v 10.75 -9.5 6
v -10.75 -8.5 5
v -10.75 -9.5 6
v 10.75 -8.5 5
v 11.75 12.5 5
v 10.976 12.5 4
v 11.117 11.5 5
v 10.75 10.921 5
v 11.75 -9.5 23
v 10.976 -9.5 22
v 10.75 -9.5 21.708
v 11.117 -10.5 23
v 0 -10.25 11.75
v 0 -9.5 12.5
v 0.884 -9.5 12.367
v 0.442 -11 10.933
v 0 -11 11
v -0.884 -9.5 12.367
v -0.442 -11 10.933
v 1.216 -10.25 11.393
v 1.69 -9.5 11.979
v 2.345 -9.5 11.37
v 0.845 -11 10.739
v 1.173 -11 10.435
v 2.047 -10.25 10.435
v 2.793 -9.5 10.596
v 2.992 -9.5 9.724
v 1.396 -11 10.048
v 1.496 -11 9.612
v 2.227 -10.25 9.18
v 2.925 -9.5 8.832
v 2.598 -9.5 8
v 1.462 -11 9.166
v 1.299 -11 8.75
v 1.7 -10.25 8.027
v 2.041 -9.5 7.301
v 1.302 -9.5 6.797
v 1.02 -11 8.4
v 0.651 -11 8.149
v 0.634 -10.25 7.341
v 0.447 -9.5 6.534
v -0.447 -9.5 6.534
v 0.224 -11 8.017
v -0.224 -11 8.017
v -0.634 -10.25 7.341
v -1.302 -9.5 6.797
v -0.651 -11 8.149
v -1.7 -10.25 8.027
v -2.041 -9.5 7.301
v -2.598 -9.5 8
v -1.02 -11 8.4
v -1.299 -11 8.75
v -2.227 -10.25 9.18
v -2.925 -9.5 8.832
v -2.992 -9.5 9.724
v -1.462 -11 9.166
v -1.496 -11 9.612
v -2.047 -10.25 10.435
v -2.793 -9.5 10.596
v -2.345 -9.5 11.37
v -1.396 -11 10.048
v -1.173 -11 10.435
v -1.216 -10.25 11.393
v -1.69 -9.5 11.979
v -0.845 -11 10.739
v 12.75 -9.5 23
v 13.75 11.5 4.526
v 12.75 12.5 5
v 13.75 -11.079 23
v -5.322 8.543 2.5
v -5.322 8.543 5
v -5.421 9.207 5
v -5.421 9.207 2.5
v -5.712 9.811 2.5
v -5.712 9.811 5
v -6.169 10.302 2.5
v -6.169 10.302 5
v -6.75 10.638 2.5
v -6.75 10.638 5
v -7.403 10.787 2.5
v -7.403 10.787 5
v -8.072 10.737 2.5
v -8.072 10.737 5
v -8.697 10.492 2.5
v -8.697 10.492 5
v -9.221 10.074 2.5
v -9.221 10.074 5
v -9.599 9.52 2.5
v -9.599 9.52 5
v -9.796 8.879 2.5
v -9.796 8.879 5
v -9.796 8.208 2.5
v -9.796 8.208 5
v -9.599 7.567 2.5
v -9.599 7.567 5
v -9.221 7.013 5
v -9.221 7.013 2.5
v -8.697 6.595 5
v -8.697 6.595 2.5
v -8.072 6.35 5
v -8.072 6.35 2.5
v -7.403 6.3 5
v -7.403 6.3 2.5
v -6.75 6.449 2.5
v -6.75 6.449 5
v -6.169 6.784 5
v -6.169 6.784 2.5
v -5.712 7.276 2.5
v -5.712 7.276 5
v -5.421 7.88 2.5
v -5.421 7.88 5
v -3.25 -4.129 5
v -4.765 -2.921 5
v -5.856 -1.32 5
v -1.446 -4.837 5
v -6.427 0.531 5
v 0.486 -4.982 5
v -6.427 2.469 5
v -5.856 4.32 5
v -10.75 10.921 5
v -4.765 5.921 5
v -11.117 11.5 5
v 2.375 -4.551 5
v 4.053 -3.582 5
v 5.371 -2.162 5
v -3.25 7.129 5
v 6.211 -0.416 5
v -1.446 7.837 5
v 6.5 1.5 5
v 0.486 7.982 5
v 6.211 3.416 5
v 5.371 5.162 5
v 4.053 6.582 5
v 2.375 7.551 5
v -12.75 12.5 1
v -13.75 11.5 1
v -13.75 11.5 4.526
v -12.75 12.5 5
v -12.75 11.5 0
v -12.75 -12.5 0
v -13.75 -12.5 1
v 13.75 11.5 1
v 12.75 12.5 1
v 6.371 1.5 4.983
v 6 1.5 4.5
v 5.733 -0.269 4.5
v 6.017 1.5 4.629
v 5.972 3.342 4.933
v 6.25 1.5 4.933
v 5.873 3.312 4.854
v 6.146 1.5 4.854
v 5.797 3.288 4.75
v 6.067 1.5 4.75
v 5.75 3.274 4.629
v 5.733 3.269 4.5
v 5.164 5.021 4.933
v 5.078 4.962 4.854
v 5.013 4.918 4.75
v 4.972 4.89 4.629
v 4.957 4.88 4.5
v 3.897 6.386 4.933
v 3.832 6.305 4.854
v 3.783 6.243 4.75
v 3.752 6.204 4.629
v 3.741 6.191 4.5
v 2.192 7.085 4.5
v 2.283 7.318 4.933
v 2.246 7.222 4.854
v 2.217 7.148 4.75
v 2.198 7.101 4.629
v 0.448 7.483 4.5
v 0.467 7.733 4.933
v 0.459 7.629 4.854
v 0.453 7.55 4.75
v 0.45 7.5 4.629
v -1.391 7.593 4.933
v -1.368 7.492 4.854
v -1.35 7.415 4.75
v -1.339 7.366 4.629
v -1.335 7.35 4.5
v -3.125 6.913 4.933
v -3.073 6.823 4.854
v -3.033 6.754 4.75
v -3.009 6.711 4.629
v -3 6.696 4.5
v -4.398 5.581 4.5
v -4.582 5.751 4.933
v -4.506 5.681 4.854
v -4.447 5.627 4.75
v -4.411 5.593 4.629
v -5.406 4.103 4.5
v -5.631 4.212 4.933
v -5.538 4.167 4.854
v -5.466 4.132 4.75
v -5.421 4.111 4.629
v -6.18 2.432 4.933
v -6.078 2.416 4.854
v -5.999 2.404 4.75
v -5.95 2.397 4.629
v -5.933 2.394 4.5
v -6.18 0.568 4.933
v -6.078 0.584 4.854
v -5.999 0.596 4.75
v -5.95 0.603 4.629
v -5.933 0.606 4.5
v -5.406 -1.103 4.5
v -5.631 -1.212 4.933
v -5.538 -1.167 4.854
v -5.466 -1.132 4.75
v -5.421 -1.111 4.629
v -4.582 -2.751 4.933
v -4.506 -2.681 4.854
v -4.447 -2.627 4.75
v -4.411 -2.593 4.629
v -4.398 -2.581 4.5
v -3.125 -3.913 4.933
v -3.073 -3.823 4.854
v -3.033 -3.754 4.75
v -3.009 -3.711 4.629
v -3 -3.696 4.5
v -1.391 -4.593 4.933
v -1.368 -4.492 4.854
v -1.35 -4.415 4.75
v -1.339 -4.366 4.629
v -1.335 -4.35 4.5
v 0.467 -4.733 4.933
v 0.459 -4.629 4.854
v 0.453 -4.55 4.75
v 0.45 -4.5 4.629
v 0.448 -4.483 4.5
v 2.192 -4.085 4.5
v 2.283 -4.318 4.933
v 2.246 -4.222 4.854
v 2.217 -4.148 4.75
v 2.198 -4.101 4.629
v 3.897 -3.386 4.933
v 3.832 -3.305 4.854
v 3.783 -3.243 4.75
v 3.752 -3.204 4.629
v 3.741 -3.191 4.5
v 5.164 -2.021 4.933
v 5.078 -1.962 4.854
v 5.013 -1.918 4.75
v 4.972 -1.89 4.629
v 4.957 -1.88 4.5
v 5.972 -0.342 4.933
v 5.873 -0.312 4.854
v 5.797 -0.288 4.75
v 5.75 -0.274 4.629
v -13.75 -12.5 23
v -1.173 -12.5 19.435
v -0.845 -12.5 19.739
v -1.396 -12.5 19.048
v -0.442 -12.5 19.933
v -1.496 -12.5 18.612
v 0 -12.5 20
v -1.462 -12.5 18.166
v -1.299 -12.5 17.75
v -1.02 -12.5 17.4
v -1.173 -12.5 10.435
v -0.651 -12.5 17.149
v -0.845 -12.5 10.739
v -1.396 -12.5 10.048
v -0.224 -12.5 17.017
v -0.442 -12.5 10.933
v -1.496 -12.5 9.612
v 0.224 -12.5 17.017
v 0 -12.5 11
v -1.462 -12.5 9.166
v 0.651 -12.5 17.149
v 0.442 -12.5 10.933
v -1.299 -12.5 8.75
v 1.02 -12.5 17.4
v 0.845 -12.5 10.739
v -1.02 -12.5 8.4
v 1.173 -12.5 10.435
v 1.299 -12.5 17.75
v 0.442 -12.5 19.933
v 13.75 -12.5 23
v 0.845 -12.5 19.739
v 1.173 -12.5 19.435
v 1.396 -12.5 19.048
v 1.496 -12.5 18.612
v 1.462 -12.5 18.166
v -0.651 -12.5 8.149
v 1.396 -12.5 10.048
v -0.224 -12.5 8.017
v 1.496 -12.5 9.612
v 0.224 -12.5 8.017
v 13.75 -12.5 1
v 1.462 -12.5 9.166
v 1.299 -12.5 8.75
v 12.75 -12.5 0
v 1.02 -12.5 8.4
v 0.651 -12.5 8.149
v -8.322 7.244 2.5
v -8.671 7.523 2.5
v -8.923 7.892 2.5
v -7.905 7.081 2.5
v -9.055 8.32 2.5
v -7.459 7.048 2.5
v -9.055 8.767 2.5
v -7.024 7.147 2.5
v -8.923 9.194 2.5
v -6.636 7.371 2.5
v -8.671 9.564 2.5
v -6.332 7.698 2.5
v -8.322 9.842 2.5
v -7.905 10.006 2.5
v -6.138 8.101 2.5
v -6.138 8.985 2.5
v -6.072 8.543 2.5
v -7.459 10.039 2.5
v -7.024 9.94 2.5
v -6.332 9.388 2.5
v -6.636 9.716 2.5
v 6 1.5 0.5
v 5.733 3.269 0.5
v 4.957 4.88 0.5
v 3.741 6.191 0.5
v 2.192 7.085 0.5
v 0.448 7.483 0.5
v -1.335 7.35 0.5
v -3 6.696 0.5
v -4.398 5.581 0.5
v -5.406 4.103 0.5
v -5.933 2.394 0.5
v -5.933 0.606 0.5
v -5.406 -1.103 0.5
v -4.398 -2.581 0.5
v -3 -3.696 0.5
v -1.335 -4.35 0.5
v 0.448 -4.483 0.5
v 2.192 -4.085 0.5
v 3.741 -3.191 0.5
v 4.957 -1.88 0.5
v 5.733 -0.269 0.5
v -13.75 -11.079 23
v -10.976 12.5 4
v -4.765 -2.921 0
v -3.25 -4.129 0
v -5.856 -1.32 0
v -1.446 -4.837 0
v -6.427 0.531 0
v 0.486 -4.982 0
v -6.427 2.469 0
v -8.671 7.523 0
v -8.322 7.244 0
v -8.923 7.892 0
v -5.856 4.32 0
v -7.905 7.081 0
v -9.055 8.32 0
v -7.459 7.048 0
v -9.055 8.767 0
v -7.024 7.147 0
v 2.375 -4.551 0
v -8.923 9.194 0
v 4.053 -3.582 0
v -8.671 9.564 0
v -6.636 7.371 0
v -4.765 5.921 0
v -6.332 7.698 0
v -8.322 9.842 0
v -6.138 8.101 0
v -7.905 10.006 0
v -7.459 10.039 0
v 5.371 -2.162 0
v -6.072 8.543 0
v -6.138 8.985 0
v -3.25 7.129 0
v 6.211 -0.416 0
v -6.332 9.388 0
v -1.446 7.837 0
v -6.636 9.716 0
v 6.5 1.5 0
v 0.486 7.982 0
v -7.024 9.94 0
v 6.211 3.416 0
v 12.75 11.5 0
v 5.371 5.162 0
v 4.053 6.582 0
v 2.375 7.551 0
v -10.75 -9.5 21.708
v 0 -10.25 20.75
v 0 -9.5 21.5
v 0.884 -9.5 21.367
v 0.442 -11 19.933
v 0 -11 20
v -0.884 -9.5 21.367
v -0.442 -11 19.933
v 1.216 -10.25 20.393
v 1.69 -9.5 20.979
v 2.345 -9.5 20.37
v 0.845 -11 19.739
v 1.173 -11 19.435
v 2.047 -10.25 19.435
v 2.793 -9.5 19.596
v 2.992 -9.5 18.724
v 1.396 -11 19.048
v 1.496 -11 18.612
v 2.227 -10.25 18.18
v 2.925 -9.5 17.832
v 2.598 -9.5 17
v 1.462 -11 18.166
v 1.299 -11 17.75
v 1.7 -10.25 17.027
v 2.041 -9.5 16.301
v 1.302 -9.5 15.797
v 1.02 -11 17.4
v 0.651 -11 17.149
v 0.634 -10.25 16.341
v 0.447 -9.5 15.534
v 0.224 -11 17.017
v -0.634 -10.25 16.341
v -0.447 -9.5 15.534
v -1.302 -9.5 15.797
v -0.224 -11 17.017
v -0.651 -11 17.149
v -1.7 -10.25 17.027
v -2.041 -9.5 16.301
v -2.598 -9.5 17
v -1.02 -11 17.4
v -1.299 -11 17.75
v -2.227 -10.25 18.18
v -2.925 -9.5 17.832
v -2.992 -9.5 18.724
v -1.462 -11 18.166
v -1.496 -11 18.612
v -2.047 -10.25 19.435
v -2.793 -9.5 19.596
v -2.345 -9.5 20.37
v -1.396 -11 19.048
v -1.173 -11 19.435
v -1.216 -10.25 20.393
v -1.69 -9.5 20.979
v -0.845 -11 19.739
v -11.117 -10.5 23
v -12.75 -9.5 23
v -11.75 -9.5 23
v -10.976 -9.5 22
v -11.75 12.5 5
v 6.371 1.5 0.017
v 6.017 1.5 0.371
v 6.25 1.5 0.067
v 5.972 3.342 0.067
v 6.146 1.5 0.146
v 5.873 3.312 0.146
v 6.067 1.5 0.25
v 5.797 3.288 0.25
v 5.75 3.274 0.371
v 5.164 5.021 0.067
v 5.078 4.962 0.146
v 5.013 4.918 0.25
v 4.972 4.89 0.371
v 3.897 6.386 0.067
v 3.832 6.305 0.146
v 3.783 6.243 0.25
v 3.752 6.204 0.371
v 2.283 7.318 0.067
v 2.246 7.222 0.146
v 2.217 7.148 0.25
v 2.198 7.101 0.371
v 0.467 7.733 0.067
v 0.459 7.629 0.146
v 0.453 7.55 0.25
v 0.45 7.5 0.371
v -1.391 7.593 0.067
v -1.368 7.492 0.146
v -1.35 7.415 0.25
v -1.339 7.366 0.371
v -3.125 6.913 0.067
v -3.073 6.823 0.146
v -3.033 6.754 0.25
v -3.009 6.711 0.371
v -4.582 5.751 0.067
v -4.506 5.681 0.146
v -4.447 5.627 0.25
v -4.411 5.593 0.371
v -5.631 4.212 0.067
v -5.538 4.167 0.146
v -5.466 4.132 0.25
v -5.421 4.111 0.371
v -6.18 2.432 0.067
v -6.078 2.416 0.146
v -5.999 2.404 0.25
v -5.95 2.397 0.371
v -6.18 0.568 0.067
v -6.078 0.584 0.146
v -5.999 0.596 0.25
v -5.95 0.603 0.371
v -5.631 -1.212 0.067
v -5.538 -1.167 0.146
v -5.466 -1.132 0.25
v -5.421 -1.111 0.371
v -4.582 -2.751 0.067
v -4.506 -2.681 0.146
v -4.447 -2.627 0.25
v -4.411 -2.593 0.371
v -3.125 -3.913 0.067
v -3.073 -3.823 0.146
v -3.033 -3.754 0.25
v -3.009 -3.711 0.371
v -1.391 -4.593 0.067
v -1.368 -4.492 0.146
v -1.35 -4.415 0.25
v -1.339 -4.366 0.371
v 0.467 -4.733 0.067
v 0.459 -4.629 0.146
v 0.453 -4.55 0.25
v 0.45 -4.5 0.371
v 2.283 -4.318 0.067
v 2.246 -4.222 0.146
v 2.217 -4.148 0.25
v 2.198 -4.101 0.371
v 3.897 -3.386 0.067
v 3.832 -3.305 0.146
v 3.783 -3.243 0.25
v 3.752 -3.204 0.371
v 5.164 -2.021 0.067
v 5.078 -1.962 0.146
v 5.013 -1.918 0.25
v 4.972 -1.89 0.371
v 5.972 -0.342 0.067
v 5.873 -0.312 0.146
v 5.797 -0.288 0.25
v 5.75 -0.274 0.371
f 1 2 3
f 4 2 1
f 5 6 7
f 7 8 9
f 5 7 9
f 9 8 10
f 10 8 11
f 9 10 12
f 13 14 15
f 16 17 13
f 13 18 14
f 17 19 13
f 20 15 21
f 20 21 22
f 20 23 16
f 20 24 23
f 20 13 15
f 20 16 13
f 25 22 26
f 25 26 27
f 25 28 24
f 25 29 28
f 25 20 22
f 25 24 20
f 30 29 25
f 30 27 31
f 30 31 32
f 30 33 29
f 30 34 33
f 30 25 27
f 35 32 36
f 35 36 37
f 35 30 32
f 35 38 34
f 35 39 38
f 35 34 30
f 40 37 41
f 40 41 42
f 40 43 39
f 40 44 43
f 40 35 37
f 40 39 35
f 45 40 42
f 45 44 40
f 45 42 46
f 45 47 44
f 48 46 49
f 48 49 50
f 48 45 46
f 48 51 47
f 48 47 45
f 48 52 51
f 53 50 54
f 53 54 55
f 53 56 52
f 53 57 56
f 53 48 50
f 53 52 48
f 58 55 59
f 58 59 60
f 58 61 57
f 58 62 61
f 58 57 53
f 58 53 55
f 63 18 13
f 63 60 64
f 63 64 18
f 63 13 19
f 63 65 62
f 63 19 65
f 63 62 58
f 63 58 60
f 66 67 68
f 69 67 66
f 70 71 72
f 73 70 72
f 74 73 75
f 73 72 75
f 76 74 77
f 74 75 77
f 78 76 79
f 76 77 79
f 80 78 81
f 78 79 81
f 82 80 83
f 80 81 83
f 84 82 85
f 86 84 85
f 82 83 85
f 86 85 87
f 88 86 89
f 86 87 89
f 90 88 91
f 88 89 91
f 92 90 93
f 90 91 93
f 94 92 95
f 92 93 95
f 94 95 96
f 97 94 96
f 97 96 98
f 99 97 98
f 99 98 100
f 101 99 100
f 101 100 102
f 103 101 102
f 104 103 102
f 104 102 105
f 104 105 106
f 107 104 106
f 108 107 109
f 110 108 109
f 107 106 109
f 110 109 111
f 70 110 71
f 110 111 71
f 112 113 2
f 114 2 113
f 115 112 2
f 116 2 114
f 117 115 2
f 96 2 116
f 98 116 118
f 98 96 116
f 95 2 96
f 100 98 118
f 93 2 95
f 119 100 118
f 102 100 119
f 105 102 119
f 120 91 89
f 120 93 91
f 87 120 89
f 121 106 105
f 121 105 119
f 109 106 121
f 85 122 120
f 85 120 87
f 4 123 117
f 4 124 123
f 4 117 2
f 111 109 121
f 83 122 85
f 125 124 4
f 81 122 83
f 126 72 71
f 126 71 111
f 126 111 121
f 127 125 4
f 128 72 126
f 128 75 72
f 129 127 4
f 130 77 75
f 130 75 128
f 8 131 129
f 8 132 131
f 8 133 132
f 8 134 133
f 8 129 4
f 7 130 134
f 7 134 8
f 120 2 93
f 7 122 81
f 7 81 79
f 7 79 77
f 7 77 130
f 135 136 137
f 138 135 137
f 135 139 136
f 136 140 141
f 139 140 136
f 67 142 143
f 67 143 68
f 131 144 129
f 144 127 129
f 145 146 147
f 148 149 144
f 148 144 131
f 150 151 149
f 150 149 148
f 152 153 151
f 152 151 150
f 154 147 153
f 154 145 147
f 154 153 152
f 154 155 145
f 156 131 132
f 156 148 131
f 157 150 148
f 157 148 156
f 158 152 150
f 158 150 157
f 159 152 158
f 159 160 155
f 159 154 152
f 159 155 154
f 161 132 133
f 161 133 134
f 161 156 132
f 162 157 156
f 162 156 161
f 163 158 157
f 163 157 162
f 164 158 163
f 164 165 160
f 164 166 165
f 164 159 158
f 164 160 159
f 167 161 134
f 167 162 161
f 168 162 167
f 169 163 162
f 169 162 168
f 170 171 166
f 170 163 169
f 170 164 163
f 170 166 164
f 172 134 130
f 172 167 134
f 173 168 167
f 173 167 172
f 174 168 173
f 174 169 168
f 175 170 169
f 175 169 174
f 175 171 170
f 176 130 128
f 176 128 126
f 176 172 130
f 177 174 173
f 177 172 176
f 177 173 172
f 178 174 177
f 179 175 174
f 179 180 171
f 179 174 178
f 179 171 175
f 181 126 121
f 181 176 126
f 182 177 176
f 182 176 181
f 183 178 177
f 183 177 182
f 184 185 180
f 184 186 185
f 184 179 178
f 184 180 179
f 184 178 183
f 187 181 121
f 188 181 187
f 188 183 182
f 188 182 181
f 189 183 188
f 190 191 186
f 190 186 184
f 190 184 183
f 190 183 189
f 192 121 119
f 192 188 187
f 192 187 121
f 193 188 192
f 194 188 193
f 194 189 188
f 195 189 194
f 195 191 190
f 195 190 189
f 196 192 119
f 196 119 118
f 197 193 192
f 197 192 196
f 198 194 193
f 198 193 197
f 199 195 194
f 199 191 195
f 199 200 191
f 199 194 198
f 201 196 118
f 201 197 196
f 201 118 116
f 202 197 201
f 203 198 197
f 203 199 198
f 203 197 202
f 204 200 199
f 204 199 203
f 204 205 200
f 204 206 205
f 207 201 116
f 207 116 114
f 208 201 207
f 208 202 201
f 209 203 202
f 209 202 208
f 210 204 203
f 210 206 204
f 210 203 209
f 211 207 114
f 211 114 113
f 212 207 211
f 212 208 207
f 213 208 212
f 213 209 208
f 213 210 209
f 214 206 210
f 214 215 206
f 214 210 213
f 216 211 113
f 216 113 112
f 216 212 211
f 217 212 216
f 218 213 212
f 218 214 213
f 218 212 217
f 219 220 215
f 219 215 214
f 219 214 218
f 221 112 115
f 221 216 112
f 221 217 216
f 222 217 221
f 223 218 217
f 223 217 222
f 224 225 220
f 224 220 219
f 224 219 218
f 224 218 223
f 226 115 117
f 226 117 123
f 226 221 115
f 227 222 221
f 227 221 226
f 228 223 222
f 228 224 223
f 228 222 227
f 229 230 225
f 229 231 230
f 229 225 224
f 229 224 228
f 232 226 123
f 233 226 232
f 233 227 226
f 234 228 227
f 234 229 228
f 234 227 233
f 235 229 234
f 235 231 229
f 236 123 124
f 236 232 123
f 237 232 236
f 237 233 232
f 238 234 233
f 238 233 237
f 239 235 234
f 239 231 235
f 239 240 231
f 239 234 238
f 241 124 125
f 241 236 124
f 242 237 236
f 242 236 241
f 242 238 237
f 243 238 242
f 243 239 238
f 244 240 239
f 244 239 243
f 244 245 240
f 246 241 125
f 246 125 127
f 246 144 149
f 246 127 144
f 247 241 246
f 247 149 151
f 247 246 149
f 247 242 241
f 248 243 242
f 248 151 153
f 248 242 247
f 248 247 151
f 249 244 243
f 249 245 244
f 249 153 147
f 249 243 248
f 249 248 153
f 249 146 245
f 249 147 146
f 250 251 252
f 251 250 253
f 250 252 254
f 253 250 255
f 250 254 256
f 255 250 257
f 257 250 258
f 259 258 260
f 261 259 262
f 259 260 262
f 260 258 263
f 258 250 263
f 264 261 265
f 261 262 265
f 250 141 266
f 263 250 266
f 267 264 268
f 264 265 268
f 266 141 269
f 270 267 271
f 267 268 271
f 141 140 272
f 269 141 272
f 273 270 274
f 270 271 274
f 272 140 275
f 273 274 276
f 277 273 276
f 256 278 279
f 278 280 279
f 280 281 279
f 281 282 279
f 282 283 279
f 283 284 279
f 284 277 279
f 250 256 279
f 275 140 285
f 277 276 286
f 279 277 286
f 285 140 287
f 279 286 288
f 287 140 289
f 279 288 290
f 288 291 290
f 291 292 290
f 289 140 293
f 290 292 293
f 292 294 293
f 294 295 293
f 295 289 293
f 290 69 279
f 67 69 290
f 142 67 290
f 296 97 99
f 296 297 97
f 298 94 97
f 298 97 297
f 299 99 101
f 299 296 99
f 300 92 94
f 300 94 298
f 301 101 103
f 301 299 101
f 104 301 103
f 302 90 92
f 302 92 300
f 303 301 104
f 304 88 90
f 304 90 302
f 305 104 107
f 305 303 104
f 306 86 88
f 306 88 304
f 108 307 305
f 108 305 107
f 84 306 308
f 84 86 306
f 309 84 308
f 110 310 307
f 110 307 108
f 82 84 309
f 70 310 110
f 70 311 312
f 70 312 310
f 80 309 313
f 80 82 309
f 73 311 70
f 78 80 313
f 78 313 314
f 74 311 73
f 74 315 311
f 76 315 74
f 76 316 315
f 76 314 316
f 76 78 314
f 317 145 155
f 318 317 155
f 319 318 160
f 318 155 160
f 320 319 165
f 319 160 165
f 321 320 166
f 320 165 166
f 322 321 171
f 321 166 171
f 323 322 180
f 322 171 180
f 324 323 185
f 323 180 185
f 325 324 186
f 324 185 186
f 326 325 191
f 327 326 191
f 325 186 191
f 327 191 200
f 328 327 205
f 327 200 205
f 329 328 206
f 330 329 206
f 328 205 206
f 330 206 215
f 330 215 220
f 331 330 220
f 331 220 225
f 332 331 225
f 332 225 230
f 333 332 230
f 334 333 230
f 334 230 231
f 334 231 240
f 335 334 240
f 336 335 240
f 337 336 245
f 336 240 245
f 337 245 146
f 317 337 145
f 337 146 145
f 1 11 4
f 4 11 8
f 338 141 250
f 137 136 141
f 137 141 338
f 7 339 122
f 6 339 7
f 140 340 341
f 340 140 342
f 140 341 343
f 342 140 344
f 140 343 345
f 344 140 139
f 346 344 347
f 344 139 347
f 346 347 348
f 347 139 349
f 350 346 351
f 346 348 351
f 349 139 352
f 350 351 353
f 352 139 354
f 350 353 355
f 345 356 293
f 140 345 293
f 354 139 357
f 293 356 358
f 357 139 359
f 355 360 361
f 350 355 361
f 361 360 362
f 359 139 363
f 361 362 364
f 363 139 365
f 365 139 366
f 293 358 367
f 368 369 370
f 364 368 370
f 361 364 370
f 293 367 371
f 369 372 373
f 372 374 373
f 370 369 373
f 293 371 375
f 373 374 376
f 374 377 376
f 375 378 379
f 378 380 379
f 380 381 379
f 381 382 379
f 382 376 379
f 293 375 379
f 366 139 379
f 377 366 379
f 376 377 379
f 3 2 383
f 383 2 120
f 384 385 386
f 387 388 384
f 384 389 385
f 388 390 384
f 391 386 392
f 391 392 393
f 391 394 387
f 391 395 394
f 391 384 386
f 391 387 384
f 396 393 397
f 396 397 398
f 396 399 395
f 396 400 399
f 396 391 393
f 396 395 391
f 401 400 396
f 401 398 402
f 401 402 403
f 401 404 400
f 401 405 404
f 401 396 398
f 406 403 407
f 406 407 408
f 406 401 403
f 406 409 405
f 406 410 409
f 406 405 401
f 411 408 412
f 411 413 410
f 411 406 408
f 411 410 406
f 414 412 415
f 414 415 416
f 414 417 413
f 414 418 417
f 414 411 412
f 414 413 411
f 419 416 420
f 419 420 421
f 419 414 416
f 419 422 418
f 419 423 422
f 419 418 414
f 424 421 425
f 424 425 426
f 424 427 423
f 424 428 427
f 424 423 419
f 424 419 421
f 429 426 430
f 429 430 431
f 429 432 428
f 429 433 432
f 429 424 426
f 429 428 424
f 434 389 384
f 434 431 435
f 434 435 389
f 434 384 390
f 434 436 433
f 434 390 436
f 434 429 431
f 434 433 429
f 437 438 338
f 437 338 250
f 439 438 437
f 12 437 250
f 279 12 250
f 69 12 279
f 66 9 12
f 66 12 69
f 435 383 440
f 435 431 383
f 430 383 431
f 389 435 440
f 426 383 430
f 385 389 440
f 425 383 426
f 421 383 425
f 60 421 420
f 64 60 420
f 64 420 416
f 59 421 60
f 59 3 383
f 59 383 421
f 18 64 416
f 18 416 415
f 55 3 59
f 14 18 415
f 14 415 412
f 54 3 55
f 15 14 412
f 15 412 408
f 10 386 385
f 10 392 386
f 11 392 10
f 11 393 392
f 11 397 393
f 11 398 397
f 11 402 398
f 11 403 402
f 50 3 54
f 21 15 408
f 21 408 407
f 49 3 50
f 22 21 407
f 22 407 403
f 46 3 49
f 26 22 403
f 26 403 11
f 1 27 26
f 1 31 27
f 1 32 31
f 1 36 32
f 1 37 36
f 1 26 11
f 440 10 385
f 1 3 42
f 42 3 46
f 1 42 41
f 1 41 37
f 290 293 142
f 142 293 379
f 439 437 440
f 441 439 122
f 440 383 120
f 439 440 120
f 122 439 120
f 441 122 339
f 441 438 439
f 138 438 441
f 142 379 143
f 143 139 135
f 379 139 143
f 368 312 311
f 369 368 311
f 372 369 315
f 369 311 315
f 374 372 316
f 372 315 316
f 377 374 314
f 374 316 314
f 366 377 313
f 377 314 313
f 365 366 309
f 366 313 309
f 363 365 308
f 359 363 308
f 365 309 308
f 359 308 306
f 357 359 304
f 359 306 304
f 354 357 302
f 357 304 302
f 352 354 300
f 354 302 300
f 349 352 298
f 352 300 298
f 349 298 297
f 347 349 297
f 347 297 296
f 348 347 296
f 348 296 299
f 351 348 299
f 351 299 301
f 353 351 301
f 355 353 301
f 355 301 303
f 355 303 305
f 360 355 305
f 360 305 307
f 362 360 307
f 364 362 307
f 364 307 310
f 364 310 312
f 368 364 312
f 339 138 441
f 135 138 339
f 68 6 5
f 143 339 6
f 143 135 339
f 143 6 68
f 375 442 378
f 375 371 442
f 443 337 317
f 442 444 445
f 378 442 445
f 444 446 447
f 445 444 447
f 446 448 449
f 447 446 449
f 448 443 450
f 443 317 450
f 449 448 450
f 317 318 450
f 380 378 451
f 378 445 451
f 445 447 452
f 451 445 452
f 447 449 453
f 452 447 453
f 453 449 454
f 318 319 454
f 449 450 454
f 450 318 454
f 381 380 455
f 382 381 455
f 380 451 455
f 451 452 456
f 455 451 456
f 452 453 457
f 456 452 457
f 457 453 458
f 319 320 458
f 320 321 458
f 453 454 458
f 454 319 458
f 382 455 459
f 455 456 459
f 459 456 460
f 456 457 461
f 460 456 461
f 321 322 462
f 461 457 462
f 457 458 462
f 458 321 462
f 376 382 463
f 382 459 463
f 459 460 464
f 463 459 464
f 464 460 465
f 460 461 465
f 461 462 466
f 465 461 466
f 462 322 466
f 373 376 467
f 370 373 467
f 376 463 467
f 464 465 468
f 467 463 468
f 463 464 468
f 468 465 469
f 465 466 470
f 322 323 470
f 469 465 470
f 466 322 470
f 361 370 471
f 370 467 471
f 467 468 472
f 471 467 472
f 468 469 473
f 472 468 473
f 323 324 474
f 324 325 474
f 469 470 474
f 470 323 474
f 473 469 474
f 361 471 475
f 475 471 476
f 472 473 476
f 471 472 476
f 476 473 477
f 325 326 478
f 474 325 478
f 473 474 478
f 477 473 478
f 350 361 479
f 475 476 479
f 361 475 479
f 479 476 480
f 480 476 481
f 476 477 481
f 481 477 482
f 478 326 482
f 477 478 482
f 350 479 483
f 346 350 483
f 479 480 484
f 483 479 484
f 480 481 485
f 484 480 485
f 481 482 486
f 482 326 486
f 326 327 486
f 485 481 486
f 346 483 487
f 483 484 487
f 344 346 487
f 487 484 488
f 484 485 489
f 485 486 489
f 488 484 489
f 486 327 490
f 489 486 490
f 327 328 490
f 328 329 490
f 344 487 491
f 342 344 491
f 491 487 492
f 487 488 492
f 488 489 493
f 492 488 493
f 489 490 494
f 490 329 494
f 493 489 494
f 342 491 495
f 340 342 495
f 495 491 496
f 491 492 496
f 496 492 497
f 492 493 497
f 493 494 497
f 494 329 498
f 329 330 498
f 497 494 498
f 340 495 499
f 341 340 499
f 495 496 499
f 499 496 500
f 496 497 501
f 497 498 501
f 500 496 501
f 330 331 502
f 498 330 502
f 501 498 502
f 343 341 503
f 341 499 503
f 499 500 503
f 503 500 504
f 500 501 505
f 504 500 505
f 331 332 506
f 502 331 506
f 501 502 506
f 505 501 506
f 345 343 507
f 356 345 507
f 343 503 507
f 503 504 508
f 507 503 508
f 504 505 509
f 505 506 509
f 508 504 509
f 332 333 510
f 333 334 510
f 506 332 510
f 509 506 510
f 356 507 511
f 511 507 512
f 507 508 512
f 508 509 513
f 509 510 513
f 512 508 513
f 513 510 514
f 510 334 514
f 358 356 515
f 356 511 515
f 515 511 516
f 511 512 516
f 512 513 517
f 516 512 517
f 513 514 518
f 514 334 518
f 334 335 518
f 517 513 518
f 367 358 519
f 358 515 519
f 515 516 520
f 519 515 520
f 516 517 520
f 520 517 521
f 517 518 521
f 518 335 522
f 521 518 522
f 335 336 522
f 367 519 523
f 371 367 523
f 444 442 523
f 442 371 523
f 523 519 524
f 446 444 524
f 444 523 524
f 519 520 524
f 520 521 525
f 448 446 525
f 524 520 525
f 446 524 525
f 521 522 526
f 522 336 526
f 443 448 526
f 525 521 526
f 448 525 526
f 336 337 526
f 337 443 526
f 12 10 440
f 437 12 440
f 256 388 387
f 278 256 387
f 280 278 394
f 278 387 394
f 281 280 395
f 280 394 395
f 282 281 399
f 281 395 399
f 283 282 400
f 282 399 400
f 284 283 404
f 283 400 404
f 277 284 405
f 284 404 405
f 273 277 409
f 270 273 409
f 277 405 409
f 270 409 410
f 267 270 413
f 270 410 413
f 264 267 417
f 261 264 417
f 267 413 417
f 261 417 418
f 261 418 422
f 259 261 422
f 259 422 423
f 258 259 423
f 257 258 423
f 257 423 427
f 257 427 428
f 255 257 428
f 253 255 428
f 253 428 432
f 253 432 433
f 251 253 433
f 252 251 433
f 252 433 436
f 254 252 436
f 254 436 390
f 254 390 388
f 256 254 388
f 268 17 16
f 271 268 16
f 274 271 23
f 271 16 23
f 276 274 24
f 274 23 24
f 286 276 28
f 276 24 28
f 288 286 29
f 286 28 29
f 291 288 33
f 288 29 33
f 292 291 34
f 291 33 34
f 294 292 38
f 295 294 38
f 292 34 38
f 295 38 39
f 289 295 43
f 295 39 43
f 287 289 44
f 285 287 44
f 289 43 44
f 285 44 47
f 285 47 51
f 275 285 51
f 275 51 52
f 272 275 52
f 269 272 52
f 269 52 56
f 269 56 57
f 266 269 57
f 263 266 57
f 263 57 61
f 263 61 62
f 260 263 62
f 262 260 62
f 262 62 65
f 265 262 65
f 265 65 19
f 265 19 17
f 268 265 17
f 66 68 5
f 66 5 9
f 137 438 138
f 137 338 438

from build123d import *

# Parameters (mm, degrees)
ESBO_O1_W                = 27.5
ESBO_O1_H                = 25
RESSALTO_EXTRUS_O1_DEPTH = 5
ESBO_O2_W                = 27.5
ESBO_O2_H                = 3
RESSALTO_EXTRUS_O2_DEPTH = 18
RESSALTO_EXTRUS_O3_DEPTH = 3
RESSALTO_EXTRUS_O4_DEPTH = 3
ESBO_O5_R                = 1.5
CORTE_EXTRUS_O1_DEPTH    = 5
CHANFRO1_SIZE            = 1.5
CHANFRO2_SIZE            = 1
CHANFRO4_SIZE            = 1
CHANFRO5_SIZE            = 1
ESBO_O6_R                = 6
ESBO_O6_R_2              = 1.5
CORTE_EXTRUS_O2_DEPTH    = 5
FILETE1_R                = 0.5
ESBO_O8_R                = 2.25
CORTE_EXTRUS_O3_DEPTH    = 2.5


with BuildPart() as part:
    # Esboço1 → Ressalto-extrusão1 (new body)
    with BuildSketch(Plane.XY):
        Rectangle(ESBO_O1_W, ESBO_O1_H)
    extrude(amount=RESSALTO_EXTRUS_O1_DEPTH)

    # Esboço2 → Ressalto-extrusão2 (add)
    with BuildSketch(Plane.XY.offset(5)):
        with Locations((0, -11)):
            Rectangle(ESBO_O2_W, ESBO_O2_H)
    extrude(amount=RESSALTO_EXTRUS_O2_DEPTH)

    # Esboço3 → Ressalto-extrusão3 (add)
    with BuildSketch(Plane(origin=(13.75, 0, 0), x_dir=(0, 0, -1), z_dir=(1, 0, 0))):
        Polygon((-5, 12.5), (-23, -9.5), (-5, -9.5), align=None)
    extrude(amount=-RESSALTO_EXTRUS_O3_DEPTH)

    # Esboço4 → Ressalto-extrusão4 (add)
    with BuildSketch(Plane.ZY.offset(13.75)):
        Polygon((5, 12.5), (5, -9.5), (23, -9.5), align=None)
    extrude(amount=-RESSALTO_EXTRUS_O4_DEPTH)

    # Esboço5 → Corte-extrusão1 (cut)
    with BuildSketch(Plane(origin=(0, -9.5, 0), x_dir=(1, 0, 0), z_dir=(0, 1, 0))):
        with Locations(Location((0, -9.5, 0), (0, 0, 270))):
            Circle(ESBO_O5_R)
        with Locations(Location((0, -18.5, 0), (0, 0, 270))):
            Circle(ESBO_O5_R)
    extrude(amount=-CORTE_EXTRUS_O1_DEPTH, mode=Mode.SUBTRACT)

    # Chanfro1
    chanfro1_edges = [part.edges().sort_by_distance(p)[0] for p in [
        (0, -9.5, 8),
        (0, -9.5, 17),
    ]]
    chamfer(chanfro1_edges, length=CHANFRO1_SIZE)

    # Chanfro2
    chanfro2_edges = [part.edges().sort_by_distance(p)[0] for p in [
        (13.75, 1.5, 14),
        (-13.75, 1.5, 14),
        (0, 12.5, 0),
        (13.75, 0, 0),
        (-13.75, 0, 0),
        (-13.75, 12.5, 2.5),
        (13.75, 12.5, 2.5),
    ]]
    chamfer(chanfro2_edges, length=CHANFRO2_SIZE)

    # Chanfro4
    chanfro4_edges = [part.edges().sort_by_distance(p)[0] for p in [
        (10.75, 1.5, 14),
        (-10.75, 1.5, 14),
    ]]
    chamfer(chanfro4_edges, length=CHANFRO4_SIZE)

    # Chanfro5
    chanfro5_edges = [part.edges().sort_by_distance(p)[0] for p in [
        (0, -9.5, 23),
        (0, -9.5, 5),
        (0, 12.5, 5),
    ]]
    chamfer(chanfro5_edges, length=CHANFRO5_SIZE)

    # Esboço6 → Corte-extrusão2 (cut)
    with BuildSketch(Plane.XY.offset(5)):
        with Locations((0, 1.5)):
            Circle(ESBO_O6_R)
        with Locations((-7.571529996, 8.543317004)):
            Circle(ESBO_O6_R_2)
    extrude(amount=-CORTE_EXTRUS_O2_DEPTH, mode=Mode.SUBTRACT)

    # Filete1
    filete1_edges = [part.edges().sort_by_distance(p)[0] for p in [
        (-6, 1.5, 0),
        (-6, 1.5, 5),
    ]]
    fillet(filete1_edges, radius=FILETE1_R)

    # Esboço8 → Corte-extrusão3 (cut)
    with BuildSketch(Plane.XY.offset(5)):
        with Locations((-7.571529996, 8.543317004)):
            Circle(ESBO_O8_R)
    extrude(amount=-CORTE_EXTRUS_O3_DEPTH, mode=Mode.SUBTRACT)


solid = part.part
